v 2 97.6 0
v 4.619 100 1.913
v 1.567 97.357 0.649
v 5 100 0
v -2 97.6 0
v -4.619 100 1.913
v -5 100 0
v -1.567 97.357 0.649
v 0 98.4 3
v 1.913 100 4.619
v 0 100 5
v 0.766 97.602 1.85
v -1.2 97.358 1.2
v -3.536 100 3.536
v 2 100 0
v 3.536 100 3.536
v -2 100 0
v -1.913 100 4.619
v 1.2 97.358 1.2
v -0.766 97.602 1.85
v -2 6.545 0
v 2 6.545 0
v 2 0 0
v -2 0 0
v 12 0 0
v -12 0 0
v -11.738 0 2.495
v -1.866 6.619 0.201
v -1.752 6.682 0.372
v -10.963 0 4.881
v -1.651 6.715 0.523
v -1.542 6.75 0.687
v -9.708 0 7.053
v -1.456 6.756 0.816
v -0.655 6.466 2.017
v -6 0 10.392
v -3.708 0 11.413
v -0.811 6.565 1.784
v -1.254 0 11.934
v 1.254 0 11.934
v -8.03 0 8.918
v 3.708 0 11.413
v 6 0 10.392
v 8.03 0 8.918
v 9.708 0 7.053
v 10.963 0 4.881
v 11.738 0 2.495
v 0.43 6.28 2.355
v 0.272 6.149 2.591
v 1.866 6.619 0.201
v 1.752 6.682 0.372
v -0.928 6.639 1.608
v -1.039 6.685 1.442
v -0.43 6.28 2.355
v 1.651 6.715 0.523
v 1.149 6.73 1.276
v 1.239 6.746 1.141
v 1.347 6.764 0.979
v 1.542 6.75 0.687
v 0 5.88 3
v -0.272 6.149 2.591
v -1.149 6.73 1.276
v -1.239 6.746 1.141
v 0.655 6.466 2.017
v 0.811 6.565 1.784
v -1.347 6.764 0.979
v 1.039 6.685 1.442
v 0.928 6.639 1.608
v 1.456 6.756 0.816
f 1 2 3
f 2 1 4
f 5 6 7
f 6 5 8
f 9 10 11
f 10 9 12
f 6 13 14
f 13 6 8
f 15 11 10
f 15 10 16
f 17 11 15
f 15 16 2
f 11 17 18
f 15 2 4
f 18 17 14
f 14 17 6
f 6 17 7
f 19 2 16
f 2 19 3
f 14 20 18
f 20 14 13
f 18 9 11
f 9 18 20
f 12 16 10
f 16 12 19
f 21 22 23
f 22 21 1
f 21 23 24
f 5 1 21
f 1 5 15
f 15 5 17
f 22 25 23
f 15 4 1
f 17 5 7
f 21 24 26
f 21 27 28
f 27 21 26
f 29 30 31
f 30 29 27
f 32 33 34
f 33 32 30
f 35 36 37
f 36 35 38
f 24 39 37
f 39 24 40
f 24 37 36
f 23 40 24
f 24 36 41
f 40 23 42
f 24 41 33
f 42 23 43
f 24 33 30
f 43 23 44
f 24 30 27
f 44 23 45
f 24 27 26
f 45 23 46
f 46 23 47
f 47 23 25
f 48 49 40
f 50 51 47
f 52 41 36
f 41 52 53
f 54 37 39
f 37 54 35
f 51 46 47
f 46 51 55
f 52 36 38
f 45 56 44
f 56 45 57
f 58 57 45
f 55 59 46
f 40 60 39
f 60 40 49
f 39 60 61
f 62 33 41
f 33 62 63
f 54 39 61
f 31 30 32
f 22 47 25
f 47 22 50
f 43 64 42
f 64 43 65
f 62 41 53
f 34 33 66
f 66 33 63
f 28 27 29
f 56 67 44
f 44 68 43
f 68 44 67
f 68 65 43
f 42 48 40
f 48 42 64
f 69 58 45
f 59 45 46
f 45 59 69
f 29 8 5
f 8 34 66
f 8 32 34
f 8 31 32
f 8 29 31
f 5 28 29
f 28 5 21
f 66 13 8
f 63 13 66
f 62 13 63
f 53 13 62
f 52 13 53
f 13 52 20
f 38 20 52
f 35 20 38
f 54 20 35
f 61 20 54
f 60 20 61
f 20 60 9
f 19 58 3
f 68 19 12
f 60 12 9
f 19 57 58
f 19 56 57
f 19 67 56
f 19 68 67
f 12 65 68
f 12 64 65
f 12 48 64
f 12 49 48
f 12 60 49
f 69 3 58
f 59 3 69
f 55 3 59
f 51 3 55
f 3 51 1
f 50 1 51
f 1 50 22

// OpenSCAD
stick_length = 100;
stick_width = 4;
stick_height = 3;

handle_radius = 12;
button_pusher_radius = 5;


union() {

// cone for the button-pusher
translate([0,stick_length,0])
rotate(a=90, v=[1,0,0])
// subtract a cube from a cylinder(cone) to get a flat side
difference() {
    cylinder(h=button_pusher_radius*0.8, r1=button_pusher_radius, r2=0);
   
    // the subtracted cube to get the flat side is 100x100x100; this should work fine as long as the cone is smaller than this.
    translate([-50,-100,-10])
    cube([100,100,100]);
}


// first cone for the handle
rotate(a=90, v=[1,0,0])
rotate(a=180, v=[0,1,0])
// subtract a cube from a cylender(cone) to get a flat side
difference() {
    cylinder(h=handle_radius*0.6, r1=handle_radius, r2=1);
    translate([-50,-100,-10])
    cube([100,100,100]);
}

//// second cone for the handle
//rotate(a=90, v=[1,0,0])
//rotate(a=180, v=[0,1,0])
//// subtract a cube from a cylender(cone) to get a flat side
//difference() {
//    cylinder(h=handle_radius*0.6, r1=handle_radius*0.7, r2=0);
//    translate([-50,-100,-10])
//    cube([100,100,100]);
//}


// triangle stick
rotate(a=90,v=[-1,0,0])
rotate(180)
linear_extrude(height=stick_length)
polygon(points=[[stick_width/2,0],[0,stick_height],[-stick_width/2,0]]);

}
